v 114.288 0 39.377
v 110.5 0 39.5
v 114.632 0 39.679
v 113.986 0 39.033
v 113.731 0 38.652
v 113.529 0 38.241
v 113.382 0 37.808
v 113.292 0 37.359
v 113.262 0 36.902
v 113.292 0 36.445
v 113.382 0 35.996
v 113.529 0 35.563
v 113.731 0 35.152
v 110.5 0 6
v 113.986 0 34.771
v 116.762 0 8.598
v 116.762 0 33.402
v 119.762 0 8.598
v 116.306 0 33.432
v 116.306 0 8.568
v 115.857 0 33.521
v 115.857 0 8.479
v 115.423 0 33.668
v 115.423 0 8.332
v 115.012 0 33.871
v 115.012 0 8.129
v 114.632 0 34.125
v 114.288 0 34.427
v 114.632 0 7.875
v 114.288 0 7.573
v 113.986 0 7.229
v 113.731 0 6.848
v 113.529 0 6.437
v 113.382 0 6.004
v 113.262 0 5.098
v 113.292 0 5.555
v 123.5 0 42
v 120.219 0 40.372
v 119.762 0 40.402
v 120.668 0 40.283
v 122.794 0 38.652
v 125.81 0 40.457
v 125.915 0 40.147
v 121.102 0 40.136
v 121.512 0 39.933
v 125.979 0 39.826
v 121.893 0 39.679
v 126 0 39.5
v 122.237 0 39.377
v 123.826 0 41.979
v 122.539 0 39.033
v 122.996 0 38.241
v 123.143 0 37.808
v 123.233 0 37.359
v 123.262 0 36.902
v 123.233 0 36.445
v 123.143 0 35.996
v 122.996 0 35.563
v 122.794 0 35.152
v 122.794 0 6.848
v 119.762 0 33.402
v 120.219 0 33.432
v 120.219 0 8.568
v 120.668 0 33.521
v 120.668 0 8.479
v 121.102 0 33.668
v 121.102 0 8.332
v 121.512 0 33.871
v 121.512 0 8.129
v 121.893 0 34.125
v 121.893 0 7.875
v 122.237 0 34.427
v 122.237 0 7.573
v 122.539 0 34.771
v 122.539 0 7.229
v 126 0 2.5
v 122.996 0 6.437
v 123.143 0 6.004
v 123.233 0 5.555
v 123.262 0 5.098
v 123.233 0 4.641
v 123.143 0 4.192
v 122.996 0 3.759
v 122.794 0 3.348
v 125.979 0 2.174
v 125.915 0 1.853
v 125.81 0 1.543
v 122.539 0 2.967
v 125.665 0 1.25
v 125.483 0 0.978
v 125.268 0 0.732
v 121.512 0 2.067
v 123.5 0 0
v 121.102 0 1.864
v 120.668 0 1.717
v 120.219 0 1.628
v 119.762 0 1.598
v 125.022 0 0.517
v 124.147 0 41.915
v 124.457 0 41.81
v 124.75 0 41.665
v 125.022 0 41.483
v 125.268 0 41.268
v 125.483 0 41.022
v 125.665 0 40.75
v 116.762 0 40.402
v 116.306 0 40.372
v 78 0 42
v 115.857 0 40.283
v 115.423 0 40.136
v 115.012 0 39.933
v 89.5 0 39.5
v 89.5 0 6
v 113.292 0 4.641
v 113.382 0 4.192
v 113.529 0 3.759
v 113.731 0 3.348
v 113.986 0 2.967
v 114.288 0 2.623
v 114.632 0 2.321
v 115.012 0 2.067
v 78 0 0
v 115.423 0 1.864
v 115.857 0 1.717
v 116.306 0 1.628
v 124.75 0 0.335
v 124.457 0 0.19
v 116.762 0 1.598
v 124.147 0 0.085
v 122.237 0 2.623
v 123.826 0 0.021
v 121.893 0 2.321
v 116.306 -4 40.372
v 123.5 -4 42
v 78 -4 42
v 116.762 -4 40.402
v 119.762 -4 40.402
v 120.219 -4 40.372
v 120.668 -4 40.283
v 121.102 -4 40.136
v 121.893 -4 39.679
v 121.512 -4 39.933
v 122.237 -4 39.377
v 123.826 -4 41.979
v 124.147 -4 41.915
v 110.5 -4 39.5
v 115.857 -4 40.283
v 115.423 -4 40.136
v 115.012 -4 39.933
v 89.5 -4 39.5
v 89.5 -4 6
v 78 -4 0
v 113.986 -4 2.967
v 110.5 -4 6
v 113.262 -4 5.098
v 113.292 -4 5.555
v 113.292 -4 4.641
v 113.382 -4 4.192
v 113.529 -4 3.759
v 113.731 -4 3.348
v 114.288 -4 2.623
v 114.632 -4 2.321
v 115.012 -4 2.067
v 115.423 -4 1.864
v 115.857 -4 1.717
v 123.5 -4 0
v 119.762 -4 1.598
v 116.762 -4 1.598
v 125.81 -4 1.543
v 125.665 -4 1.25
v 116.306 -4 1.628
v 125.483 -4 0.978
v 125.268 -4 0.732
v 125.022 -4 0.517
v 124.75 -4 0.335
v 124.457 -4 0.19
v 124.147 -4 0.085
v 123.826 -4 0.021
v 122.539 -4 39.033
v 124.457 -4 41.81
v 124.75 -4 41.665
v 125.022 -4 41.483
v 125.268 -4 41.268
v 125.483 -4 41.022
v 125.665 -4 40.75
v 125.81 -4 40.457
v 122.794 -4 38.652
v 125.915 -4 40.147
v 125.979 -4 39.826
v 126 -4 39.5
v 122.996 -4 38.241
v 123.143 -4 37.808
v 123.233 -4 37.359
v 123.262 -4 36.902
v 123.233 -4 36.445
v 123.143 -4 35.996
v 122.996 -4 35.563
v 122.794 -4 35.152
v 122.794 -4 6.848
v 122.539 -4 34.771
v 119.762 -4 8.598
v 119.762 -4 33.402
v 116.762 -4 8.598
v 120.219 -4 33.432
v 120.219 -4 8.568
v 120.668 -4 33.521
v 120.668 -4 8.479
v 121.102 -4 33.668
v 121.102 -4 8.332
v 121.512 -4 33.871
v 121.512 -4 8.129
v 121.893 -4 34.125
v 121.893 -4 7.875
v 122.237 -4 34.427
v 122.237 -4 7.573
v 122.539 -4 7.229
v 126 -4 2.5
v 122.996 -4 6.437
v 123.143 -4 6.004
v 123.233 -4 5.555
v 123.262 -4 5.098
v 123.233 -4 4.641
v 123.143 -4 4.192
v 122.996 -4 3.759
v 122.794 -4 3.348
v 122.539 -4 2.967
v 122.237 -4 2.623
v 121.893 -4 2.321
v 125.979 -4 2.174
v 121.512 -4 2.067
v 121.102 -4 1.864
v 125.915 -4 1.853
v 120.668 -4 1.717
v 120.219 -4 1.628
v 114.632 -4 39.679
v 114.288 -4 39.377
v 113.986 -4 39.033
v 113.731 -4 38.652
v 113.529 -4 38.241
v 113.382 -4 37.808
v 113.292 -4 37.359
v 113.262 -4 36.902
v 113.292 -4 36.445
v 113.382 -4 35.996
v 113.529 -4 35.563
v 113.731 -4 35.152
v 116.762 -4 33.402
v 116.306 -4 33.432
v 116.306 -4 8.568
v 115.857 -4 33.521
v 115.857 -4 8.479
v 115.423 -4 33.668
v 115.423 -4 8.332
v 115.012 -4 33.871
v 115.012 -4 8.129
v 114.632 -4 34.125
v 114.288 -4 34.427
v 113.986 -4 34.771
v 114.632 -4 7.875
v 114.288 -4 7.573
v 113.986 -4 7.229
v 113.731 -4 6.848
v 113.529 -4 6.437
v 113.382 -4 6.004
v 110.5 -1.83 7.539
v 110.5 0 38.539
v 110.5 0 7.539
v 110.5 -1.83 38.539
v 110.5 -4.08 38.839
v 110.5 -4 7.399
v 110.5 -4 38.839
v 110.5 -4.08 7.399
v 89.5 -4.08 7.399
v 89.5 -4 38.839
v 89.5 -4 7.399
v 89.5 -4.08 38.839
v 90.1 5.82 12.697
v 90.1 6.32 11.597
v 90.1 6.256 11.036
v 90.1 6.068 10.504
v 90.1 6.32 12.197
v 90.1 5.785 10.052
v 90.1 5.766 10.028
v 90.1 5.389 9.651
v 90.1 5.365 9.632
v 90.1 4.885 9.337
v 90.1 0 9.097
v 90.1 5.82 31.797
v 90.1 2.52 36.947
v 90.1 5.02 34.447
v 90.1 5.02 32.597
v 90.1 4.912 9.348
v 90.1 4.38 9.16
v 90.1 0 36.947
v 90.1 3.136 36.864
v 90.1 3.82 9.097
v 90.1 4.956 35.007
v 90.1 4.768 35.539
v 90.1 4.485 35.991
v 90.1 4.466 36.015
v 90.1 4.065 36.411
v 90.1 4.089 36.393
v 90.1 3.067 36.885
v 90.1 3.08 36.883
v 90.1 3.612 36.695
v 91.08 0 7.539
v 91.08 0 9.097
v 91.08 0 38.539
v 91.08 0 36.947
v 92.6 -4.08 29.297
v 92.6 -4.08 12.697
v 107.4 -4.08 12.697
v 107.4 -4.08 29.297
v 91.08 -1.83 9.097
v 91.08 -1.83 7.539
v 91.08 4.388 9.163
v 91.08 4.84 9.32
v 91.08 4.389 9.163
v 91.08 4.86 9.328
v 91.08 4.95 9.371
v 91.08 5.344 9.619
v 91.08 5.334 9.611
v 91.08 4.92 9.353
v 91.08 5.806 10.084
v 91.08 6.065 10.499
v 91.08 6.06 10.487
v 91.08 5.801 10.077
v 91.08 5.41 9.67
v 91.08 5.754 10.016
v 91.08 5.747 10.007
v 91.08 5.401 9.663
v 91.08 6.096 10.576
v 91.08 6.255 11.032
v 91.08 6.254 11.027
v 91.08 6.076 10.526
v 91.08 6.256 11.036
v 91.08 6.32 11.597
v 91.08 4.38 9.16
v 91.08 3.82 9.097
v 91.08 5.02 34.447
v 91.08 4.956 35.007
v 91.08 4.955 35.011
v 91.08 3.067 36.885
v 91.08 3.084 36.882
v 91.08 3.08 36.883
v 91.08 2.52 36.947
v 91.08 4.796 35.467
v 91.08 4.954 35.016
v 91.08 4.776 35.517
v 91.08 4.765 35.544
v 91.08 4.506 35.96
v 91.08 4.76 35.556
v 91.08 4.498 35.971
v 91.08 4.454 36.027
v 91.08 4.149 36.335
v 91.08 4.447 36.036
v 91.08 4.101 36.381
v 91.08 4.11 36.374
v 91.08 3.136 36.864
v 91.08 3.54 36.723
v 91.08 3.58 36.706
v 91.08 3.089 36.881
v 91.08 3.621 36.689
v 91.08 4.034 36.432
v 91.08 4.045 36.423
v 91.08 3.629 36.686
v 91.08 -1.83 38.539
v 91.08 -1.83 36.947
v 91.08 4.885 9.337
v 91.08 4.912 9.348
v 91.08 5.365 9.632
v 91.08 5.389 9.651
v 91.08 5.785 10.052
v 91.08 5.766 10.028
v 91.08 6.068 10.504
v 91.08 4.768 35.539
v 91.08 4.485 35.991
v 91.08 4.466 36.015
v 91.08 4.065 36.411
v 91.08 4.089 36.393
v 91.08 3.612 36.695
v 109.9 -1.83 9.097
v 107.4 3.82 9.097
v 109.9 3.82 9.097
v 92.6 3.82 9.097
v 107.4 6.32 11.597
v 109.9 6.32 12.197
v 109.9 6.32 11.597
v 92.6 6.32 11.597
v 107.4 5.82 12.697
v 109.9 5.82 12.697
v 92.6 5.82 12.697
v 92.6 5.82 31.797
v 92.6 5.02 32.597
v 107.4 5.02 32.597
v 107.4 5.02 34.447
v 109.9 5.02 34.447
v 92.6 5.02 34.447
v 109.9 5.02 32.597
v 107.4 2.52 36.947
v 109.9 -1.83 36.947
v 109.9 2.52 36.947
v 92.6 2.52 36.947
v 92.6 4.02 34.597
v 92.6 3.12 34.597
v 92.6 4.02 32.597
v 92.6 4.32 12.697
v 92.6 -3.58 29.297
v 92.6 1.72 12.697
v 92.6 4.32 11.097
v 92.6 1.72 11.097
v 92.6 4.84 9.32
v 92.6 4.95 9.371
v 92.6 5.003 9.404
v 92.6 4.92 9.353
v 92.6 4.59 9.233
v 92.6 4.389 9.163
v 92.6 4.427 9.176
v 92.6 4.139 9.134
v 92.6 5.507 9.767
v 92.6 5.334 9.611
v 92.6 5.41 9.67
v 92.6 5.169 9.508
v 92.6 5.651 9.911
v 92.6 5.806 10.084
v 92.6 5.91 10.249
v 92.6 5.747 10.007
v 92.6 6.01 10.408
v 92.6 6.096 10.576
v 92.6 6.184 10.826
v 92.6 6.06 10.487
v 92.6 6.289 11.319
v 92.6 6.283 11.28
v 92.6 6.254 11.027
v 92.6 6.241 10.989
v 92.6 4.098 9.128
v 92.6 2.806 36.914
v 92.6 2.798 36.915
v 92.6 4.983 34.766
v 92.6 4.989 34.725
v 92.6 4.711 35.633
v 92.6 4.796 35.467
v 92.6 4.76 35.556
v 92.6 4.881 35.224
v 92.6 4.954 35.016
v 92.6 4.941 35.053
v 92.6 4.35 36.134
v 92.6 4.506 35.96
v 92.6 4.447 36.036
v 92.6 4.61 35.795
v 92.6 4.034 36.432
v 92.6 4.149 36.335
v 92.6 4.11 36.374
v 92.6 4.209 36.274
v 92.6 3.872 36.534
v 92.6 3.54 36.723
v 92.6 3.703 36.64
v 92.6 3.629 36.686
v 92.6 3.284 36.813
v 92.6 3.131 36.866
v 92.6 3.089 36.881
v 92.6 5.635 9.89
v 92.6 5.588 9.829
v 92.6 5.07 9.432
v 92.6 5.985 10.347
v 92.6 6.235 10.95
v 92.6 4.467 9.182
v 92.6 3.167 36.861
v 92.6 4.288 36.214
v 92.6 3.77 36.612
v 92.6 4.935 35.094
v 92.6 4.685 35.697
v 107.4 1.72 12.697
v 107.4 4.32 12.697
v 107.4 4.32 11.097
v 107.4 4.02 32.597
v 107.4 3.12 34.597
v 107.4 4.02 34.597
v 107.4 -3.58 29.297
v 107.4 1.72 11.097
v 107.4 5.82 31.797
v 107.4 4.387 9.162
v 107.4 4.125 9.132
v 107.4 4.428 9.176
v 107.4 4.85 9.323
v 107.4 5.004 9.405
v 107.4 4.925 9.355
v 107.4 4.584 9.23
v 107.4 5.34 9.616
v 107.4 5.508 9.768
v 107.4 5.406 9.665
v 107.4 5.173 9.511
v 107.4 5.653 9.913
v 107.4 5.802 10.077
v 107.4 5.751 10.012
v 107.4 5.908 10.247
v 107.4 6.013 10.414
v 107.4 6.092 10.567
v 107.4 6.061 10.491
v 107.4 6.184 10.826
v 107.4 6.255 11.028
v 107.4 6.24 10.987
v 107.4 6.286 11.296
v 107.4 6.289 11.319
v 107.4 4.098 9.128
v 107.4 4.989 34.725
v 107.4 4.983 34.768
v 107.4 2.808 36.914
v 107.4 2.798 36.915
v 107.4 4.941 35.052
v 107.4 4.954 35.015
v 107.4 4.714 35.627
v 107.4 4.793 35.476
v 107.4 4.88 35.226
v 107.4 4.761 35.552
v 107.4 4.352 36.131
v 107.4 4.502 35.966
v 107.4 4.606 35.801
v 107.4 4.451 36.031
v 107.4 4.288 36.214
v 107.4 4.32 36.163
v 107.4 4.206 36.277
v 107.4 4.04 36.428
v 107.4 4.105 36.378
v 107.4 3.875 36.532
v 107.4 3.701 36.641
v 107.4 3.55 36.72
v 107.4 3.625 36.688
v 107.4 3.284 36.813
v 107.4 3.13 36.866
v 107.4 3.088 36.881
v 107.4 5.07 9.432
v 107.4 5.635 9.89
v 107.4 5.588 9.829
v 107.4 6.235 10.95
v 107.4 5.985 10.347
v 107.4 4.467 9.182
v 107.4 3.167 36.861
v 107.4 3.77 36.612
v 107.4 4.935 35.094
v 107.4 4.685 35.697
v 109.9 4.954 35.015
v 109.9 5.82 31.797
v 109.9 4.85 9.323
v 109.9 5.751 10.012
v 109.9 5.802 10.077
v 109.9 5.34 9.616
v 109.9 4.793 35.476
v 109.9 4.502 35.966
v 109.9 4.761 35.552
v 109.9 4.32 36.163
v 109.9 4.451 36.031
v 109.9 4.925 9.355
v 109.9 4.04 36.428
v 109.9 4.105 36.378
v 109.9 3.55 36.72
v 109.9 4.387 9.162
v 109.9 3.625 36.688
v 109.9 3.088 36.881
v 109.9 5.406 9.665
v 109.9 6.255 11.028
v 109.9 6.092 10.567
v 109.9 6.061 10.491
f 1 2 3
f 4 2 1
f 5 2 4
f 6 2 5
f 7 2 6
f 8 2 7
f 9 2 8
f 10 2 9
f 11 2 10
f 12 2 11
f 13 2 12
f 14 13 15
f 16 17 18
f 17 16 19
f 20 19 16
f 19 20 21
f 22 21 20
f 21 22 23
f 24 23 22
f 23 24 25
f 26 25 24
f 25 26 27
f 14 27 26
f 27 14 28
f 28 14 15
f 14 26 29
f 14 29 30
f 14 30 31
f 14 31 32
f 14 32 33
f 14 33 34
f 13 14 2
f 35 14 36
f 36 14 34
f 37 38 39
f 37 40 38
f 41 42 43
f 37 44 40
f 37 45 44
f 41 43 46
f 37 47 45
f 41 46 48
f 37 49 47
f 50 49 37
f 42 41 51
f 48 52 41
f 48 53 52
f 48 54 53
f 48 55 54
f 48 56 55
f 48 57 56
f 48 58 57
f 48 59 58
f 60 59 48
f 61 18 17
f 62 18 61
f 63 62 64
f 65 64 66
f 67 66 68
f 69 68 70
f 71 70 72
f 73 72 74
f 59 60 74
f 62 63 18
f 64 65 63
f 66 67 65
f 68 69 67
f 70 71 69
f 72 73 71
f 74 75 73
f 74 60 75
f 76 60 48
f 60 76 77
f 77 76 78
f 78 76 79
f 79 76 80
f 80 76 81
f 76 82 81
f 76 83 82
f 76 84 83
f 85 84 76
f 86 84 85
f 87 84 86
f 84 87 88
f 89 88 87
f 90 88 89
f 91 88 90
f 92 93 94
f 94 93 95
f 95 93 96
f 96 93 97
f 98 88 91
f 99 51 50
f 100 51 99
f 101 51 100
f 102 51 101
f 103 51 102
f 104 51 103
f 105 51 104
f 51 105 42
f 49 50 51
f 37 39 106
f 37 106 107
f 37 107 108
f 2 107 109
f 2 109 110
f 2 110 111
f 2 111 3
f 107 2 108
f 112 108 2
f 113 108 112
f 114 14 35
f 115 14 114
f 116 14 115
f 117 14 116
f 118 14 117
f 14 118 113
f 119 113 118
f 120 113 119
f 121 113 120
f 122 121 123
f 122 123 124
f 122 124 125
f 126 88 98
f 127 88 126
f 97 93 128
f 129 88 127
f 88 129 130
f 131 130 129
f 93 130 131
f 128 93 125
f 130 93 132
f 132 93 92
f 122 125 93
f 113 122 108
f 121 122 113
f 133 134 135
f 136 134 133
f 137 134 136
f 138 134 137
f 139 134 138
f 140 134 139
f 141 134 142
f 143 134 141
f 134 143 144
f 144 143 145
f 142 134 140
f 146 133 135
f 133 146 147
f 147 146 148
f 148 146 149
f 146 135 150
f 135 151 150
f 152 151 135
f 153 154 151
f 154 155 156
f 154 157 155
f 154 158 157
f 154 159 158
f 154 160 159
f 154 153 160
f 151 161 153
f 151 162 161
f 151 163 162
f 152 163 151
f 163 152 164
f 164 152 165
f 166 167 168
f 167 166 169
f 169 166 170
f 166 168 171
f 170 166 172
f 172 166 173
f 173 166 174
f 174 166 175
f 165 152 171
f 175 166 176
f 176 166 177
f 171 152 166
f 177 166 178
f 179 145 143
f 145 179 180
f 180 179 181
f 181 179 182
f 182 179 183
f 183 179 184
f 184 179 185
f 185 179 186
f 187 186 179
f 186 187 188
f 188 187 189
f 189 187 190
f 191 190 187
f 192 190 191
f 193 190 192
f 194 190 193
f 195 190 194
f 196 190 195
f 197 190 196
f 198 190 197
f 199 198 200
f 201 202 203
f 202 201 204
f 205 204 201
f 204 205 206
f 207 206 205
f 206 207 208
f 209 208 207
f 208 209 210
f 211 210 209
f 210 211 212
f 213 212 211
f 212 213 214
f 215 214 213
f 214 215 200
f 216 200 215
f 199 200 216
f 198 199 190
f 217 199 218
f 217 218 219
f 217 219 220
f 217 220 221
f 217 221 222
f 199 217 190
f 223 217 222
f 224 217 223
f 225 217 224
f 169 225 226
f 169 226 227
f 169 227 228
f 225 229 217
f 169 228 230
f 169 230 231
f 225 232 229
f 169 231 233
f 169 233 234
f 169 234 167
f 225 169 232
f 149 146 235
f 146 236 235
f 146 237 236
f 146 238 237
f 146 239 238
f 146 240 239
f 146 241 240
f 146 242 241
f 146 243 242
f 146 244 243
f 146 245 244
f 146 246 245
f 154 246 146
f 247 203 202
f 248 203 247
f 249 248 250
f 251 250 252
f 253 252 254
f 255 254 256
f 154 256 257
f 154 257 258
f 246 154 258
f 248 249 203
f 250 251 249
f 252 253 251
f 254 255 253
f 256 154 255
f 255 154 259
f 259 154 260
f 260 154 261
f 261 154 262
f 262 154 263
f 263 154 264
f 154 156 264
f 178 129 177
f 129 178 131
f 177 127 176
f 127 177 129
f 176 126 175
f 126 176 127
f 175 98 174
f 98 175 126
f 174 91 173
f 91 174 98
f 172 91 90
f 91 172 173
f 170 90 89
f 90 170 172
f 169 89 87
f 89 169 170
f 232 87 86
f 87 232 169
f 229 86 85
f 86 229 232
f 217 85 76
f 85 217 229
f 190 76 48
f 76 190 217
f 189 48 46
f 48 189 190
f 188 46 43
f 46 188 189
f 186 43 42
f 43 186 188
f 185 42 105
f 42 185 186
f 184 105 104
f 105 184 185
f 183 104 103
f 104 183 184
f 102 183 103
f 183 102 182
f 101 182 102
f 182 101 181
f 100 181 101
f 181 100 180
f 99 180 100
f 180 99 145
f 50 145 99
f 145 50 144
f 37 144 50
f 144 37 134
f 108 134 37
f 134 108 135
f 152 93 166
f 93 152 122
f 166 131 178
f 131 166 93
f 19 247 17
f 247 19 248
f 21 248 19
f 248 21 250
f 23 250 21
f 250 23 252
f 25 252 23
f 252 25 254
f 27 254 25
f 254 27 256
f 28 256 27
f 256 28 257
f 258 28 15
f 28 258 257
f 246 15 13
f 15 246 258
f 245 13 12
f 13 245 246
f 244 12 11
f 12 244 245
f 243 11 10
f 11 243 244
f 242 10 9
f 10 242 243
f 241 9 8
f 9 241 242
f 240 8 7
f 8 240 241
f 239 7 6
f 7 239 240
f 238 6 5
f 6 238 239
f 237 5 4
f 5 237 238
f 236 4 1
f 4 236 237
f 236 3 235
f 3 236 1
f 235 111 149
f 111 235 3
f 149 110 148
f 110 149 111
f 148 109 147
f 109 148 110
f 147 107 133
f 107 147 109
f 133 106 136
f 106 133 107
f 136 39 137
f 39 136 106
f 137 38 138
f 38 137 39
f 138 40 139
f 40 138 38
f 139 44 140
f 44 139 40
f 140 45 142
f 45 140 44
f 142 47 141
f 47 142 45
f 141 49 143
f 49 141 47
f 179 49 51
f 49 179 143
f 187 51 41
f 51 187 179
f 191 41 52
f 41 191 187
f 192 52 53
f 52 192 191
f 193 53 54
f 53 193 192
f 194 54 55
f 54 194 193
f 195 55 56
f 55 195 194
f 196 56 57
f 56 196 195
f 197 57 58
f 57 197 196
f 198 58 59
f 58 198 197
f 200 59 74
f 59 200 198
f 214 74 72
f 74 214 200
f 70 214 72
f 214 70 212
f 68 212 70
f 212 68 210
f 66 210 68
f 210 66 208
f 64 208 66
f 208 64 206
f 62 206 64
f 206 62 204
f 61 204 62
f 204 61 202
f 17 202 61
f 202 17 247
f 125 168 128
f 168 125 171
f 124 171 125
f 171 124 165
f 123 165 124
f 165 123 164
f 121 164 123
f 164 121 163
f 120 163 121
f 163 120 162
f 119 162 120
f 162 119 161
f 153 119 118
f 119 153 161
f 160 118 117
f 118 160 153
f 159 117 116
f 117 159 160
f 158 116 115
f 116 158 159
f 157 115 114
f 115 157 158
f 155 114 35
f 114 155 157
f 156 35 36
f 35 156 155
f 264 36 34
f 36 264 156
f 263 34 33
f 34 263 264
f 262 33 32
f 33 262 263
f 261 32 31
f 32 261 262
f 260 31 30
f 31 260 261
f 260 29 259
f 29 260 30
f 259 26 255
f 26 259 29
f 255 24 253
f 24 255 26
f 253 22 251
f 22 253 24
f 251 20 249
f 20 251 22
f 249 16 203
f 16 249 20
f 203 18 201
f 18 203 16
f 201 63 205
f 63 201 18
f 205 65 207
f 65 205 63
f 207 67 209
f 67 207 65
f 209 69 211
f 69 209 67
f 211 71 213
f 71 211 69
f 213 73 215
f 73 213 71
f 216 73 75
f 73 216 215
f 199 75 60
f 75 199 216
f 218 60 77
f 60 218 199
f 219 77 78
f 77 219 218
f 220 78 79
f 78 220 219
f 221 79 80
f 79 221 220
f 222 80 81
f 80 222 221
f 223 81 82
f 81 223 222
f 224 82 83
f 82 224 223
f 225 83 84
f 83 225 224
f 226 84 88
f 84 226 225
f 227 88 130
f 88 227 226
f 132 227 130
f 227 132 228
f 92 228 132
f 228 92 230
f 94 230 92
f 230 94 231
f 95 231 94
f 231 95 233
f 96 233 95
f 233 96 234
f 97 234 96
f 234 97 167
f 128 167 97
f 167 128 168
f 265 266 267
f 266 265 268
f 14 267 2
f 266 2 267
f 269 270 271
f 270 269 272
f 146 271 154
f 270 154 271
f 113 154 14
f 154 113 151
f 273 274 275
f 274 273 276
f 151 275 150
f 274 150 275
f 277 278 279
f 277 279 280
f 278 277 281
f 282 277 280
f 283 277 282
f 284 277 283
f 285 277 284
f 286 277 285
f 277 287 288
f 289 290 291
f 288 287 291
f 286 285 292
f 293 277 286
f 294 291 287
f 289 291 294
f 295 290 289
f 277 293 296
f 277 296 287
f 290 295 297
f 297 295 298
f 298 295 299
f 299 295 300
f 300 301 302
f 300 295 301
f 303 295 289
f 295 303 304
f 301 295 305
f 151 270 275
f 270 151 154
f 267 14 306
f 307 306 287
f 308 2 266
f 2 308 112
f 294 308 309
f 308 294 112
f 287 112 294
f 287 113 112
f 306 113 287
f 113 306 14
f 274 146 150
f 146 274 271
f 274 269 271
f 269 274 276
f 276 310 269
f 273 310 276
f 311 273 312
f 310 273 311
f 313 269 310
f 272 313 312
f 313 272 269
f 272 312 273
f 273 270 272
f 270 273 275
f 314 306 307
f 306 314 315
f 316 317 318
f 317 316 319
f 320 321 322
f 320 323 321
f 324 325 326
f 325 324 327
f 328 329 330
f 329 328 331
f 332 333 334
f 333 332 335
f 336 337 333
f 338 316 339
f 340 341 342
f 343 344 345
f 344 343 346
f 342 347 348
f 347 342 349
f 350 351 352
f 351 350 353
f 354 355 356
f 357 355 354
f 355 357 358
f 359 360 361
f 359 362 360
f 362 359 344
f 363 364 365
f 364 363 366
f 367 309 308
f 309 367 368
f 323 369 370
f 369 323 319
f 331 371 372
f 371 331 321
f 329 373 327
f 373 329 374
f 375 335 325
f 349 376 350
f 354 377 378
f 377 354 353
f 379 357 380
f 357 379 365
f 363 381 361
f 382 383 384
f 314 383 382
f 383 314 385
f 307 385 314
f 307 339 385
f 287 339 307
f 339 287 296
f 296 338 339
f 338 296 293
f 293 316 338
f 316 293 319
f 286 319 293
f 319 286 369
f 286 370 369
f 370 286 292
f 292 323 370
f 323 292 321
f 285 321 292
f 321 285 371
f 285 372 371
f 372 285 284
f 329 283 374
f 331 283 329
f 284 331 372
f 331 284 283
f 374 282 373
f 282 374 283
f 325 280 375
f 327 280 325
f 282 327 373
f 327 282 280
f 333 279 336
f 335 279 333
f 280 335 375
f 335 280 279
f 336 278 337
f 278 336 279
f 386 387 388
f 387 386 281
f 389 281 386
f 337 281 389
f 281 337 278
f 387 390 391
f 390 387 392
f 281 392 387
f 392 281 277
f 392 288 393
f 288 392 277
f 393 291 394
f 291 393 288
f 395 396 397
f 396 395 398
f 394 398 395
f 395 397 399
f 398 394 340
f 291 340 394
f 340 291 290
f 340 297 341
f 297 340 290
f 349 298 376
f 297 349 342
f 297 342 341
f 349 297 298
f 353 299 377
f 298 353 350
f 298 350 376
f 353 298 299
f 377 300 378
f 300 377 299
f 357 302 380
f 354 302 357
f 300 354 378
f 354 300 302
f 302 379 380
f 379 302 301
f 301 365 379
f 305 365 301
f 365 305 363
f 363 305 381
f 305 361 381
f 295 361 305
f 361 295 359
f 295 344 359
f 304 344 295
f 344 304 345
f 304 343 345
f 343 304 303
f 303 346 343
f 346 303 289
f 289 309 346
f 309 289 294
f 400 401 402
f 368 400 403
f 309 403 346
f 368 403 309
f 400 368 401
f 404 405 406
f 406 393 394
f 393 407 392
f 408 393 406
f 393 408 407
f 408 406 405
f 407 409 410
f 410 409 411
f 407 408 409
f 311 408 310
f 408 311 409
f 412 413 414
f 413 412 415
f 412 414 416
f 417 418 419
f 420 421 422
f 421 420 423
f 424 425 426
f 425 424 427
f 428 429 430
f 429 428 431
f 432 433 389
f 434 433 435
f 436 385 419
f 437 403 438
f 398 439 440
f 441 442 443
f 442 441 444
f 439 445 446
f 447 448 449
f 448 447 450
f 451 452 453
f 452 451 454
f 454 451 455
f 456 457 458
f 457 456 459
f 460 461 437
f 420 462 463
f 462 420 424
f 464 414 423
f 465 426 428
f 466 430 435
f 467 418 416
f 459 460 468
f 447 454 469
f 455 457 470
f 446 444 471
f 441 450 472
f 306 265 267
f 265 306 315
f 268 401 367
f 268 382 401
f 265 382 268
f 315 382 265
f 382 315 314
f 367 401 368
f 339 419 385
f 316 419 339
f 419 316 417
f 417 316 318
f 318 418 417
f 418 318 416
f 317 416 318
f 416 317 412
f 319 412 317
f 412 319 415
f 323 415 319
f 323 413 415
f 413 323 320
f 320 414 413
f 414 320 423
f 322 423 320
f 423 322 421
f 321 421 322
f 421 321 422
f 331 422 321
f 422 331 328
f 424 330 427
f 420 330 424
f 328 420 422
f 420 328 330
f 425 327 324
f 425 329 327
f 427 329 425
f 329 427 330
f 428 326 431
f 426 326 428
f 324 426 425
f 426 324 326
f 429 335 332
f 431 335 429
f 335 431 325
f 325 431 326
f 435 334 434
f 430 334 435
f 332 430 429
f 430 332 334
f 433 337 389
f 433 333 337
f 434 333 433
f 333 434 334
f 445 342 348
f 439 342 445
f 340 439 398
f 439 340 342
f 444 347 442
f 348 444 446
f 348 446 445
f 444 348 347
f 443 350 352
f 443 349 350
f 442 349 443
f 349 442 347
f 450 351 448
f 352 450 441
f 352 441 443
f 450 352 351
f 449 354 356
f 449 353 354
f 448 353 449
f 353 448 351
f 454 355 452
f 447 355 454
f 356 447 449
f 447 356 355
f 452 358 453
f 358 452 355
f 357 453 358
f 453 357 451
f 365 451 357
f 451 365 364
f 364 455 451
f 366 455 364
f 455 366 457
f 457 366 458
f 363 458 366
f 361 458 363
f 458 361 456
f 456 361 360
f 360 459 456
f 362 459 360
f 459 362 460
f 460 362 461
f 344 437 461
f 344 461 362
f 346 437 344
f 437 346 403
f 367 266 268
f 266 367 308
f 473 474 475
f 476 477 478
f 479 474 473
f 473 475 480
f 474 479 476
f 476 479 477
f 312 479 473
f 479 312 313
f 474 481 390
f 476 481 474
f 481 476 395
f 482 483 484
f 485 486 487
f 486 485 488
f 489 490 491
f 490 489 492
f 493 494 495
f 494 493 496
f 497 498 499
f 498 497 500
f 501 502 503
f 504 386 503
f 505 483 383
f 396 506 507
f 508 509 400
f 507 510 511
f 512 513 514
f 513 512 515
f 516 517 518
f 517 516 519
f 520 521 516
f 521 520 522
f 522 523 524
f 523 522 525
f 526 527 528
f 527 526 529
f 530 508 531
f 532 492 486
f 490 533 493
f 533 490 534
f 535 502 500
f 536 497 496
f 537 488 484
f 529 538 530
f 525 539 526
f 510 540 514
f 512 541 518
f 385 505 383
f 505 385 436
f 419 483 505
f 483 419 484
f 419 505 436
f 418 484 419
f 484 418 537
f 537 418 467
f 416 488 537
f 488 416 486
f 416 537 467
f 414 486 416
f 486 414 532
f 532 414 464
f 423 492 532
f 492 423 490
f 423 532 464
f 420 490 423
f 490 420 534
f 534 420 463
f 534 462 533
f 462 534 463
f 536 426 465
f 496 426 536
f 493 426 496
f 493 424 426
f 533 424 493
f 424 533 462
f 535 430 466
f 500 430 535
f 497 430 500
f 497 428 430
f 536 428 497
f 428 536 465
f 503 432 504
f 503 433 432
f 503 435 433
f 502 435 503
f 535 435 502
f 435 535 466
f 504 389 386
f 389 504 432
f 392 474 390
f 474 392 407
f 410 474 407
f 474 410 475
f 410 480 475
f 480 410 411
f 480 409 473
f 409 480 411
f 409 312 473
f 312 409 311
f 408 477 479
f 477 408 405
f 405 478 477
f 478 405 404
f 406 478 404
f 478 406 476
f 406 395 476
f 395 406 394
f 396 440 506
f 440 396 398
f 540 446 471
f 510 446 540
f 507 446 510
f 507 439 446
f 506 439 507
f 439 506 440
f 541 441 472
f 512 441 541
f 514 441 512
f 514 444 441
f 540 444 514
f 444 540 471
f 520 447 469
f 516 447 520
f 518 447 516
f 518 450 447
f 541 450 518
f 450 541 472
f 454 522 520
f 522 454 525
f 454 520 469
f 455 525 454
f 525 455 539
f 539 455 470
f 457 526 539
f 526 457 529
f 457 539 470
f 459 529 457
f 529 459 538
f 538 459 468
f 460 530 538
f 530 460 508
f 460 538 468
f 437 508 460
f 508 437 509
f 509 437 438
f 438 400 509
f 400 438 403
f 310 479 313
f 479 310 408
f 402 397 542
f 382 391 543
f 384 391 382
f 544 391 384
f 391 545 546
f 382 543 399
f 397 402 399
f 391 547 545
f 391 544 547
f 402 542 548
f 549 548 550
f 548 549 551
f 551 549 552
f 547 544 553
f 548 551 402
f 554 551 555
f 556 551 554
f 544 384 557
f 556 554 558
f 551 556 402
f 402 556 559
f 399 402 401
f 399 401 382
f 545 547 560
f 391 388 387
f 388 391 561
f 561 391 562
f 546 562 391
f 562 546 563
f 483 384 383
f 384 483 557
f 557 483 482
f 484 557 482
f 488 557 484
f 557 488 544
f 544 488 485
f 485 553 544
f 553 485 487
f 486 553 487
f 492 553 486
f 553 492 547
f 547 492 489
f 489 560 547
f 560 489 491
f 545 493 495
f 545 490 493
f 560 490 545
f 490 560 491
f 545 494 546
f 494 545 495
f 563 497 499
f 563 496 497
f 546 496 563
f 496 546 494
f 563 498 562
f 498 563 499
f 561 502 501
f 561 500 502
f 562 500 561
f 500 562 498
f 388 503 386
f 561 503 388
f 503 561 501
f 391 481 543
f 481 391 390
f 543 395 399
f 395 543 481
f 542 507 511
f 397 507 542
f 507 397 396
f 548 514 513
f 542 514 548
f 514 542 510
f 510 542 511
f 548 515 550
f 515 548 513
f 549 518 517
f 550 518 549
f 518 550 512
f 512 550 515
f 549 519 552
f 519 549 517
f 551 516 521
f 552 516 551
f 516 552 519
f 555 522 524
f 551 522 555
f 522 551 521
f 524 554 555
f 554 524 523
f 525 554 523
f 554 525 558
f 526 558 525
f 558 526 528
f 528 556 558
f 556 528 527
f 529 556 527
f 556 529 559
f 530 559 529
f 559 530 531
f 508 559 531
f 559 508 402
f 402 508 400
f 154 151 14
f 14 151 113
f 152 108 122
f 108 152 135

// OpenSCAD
// Lab Rax generic equipment tray + faceplate (wizard template).
// Faceplate derived from the Pi4 baseline; rack holes follow the four-corner layout of the user-supplied
// 1U blank plate (faceplate_mounting.json): EVERY rack unit gets 4 holes, never a single centre pair.
// The wizard appends override assignments at the end of this file.
// PROPOSED, UNVALIDATED: printed fit, strength and rack clearance are UNKNOWN.
$fn=48;
part="assembly";            // assembly, faceplate, tray, combined, rear_bracket
// Device envelope (mm). Origin of hole coordinates = device front-left corner, seen from above.
dev_w=85; dev_d=56; dev_h=20;
holes=[];                   // [[x,y],...] mounting hole centres
hole_d=2.7;                 // device mounting hole diameter
device_mount="inserts";     // inserts, pegs, clips, straps
standoff=6;                 // device lift above tray floor
insert_pilot=3.2;           // pilot for heat-set insert (inserts mode)
board_t=1.6;                // board/flange thickness (pegs, clips)
joint="screw";              // screw, single ("snap" retired 2026-10-19: too brittle; kept as history)
u=1;                        // faceplate height in rack units
keystones=[];               // [x,...] keystone centres on faceplate (X=0 centre)
// Keystone v2 (2026-10-19, now the fallback; see ks_style): re-modelled from measurements of Brian's reference keystone frame
// (14.5 x 16 opening was too narrow when printed). Opening 14.8 x 16.6 through the plate, plus a rear collar
// 19.8 x 27.85 reaching 9.2 mm behind the front face (bottom lip to 10.4) that carries the latch ramp and catches.
ks_w=14.8; ks_h=16.6;       // front opening
ks_ow=19.8; ks_ob=11.9; ks_ot=15.95; ks_od=9.2; ks_lip=10.4;  // collar width, below/above opening centre, depth
ports=[];                   // [[x,z,w,h,r],...] faceplate cut-outs, z from plate bottom, r=corner radius
front_gap=12;               // device front to faceplate rear face
margin=8;                   // tray border around device
rear_support=false;         // heavy/deep equipment: tray runs to the rear posts and screws to a rear bracket
coupon=[];                  // test coupon: [x0,x1,ymax] keeps only that slice of the part

// 4 mm plate (owner default 2026-10-18). Corner radius is limited by the four-corner holes:
// the reference holes sit 1.6 mm from the top/bottom edge, so larger corners would cut into them.
plate_w=252; plate_t=4; plate_r=2.5; plate_h=u*44.45-2.45;
hole_x=118.2625; hole_dz=15.902;   // each U: holes at its centre ±hole_dz (5.098 / 36.902 on a 1U plate)
rack_depth=240;             // Lab Rax frame depth (front of front posts to back of rear posts)
nudge=0;                    // render-repair only: tiny size offset applied when OpenSCAD 2021 emits a sliver
tray_t=3; tray_z=7;
tray_w=dev_w+2*margin; tray_d=rear_support?rack_depth:dev_d+front_gap+margin;
tray_x=-tray_w/2; tray_y=0;
dev_x=-dev_w/2; dev_y=front_gap; floor_top=tray_z+tray_t;
jx=min(40,tray_w/2-12); joint_x=[-jx,jx];
tongue_w=12; tongue_depth=7; tongue_h=3; tongue_z=tray_z+3.5;
slot_clear=0.3; boss_d=9; m3_clear=3.4; joint_pilot=4.0;  // 4.0 = the printed, well-fitting Pi4 trial

module capsule2d(len=10,diam=7){hull(){translate([-(len-diam)/2,0])circle(d=diam);translate([(len-diam)/2,0])circle(d=diam);}}
module rrect(w,h,r){rr=min(r,w/2-0.01,h/2-0.01);if(rr<=0)square([w,h],center=true);else offset(r=rr)square([w-2*rr,h-2*rr],center=true);}
// Mirror front-of-tray features to the rear (about the rack's mid-depth).
module to_rear(){translate([0,rack_depth/2,0])mirror([0,1,0])translate([0,-rack_depth/2,0])children();}

// Faceplate outline seen from the front: 2D X = rack X, 2D Y = height Z.
// rear=true cuts the larger keystone pocket; plain=true leaves out keystones/ports (rear bracket).
module plate2d(rear=false,plain=false){
 difference(){
  hull()for(sx=[-1,1],sz=[-1,1])translate([sx*(plate_w/2-plate_r),plate_h/2+sz*(plate_h/2-plate_r)])circle(r=plate_r+nudge);
  for(i=[0:u-1],dz=[-hole_dz,hole_dz],x=[-hole_x,hole_x])translate([x,i*44.45+21+dz])capsule2d();
  if(!plain){
   for(p=ports)translate([p[0],p[1]])rrect(p[2],p[3],p[4]);
  }
 }
}
// Plate between y=y0 (front) and y0+t, built from the 2D outline (cleaner meshes than 3D cuts in OpenSCAD 2021).
module plate_layer(y0,t,rear=false,plain=false){translate([0,y0+t,0])rotate([90,0,0])linear_extrude(height=t)plate2d(rear,plain);}

module plate_joint_add(){
 if(joint=="screw"){
  for(x=joint_x)translate([x-tongue_w/2,0,tongue_z])cube([tongue_w,tongue_depth,tongue_h]);
  for(x=joint_x)translate([x,0,tray_z+14])rotate([-90,0,0])cylinder(d=boss_d,h=8);
 }
 if(joint=="snap") for(x=joint_x){
  // Cantilever arm under the tray floor; barb snaps up into a floor window.
  translate([x-4,0,tray_z-2])cube([8,16,2]);
  // Barb v2: square catch face toward the plate, ramp falling toward the rear so the tray, slid in
  // from the rear, cams the arm down until its window drops over the barb.
  translate([x-4,12,tray_z])hull(){cube([8,0.6,1.2]);cube([8,2.4,0.01]);}
 }
}
// Keystone collar behind the plate, and the jack-shaped cut through plate + collar.
// Profile in (d = depth behind front face, z from opening centre); X width is ks_w throughout.
module ks_collar(){for(x=keystones)translate([x-ks_ow/2,-plate_t,plate_h/2]){
 translate([0,0,-ks_ob])cube([ks_ow,ks_od,ks_ob+ks_ot]);
 translate([0,0,-ks_ob])cube([ks_ow,ks_lip,ks_ob-ks_h/2]);
}}
module ks_cut(){for(x=keystones)translate([x-ks_w/2,-plate_t,plate_h/2])rotate([90,0,90])linear_extrude(height=ks_w)
 polygon([[-1,-ks_h/2],[5.8,-ks_h/2],[5.8,-9.9],[9.2,-9.9],[9.2,-ks_h/2],[11,-ks_h/2],[11,11.6],[8.2,11.6],
          [8.2,ks_ot+1],[7.2,ks_ot+1],[7.2,13.6],[0.6,ks_h/2],[-1,ks_h/2]]);}
// Golden keystone (Brian, 2026-10-19): exact cross-sections of the keystone on Brian's SG108 faceplate, which fits
// perfectly in practice. Source: "10 inch shelf TP-Link SG108 Plus Keystone" by Goul (MakerWorld remix, BY-NC-SA),
// local/personal use only, never redistributed. Each band: [X from opening centre, width, polygons in source (Y, Z)]
// with source Y running down the plate (opening centre Y=25.09) and Z = depth (keystone face 0, plate back 4.08).
// The block replaces the plate within 21 x 33.5 mm around each keystone; front face sits 0.08 proud like the source.
ks_style="golden";          // golden (SG108 copy) or v2 (own measured rebuild, kept as fallback)
KS_GOLD=[
  [-10.50,0.60,[[[45.500,4.080],[45.500,0.080],[38.691,0.080],[38.691,0.000],[7.251,0.000],[7.251,0.080],[1.000,0.080],[1.000,4.080],[1.071,4.080]]]],
  [-9.90,0.98,[[[9.143,4.080],[9.143,6.600],[9.205,7.147],[9.207,7.160],[9.226,7.216],[9.395,7.692],[9.679,8.145],[9.697,8.169],[10.075,8.546],[10.099,8.565],[10.551,8.848],[11.083,9.036],[11.643,9.100],[13.493,9.100],[14.293,9.900],[33.393,9.900],[33.893,10.400],[34.493,10.400],[35.054,10.336],[35.586,10.148],[36.038,9.865],[36.062,9.846],[36.439,9.469],[36.458,9.445],[36.742,8.992],[36.753,8.965],[36.930,8.460],[36.993,7.900],[36.993,4.080],[45.500,4.080],[45.500,0.080],[38.691,0.080],[38.691,0.000],[7.251,0.000],[7.251,0.080],[1.000,0.080],[1.000,4.080],[1.014,4.080]]]],
  [-8.92,1.52,[[[7.551,4.080],[7.551,2.250],[9.143,2.250],[9.143,6.600],[9.209,7.169],[9.367,7.620],[9.404,7.709],[9.658,8.114],[9.716,8.190],[9.755,8.229],[10.054,8.527],[10.130,8.586],[10.534,8.840],[10.623,8.876],[11.074,9.034],[11.643,9.100],[13.493,9.100],[14.293,9.900],[33.393,9.900],[33.893,10.400],[34.493,10.400],[35.063,10.334],[35.514,10.176],[35.603,10.140],[36.006,9.886],[36.083,9.827],[36.420,9.490],[36.479,9.414],[36.719,9.030],[36.737,9.000],[36.770,8.920],[36.927,8.469],[36.993,7.900],[36.993,2.250],[38.551,2.250],[38.551,4.080],[45.500,4.080],[45.500,0.080],[38.691,0.080],[38.691,0.000],[7.251,0.000],[7.251,0.080],[1.000,0.080],[1.000,4.080],[1.044,4.080]]]],
  [-7.40,14.80,[[[7.551,4.080],[7.551,2.250],[9.143,2.250],[9.143,6.600],[9.175,6.878],[9.229,7.247],[9.478,7.850],[9.876,8.368],[10.393,8.765],[10.996,9.015],[11.365,9.069],[11.643,9.100],[13.493,9.100],[13.493,8.100],[11.493,8.100],[11.493,7.200],[16.793,0.500],[16.793,0.000],[7.251,0.000],[7.251,0.080],[1.000,0.080],[1.000,4.080],[1.025,4.080]],[[45.500,4.080],[45.500,0.080],[38.691,0.080],[38.691,0.000],[33.393,0.000],[33.393,5.800],[34.993,5.800],[34.993,8.400],[33.393,8.400],[33.393,9.900],[33.893,10.400],[34.493,10.400],[34.771,10.369],[35.140,10.315],[35.743,10.065],[36.200,9.715],[36.261,9.668],[36.658,9.150],[36.908,8.547],[36.962,8.178],[36.993,7.900],[36.993,2.250],[38.551,2.250],[38.551,4.080],[42.555,4.080]]]],
  [7.40,2.50,[[[45.500,4.080],[45.500,0.080],[38.691,0.080],[38.691,0.000],[7.251,0.000],[7.251,0.080],[1.000,0.080],[1.000,4.080],[7.551,4.080],[7.551,2.250],[9.143,2.250],[9.143,6.600],[9.209,7.168],[9.370,7.630],[9.402,7.705],[9.662,8.120],[9.712,8.185],[9.927,8.400],[10.059,8.531],[10.124,8.582],[10.538,8.841],[10.614,8.873],[11.075,9.034],[11.643,9.100],[13.493,9.100],[14.293,9.900],[33.393,9.900],[33.893,10.400],[34.493,10.400],[35.062,10.335],[35.523,10.172],[35.599,10.141],[36.013,9.882],[36.078,9.831],[36.425,9.486],[36.474,9.420],[36.735,9.005],[36.767,8.930],[36.928,8.467],[36.993,7.900],[36.993,2.250],[38.551,2.250],[38.551,4.080],[42.599,4.080]]]],
  [9.90,0.60,[[[45.500,4.080],[45.500,0.080],[38.691,0.080],[38.691,0.000],[7.251,0.000],[7.251,0.080],[1.000,0.080],[1.000,4.080],[7.551,4.080],[7.551,2.250],[38.551,2.250],[38.551,4.080],[42.635,4.080]]]]
];
module ks_golden(){for(x=keystones)translate([x,0,plate_h/2])multmatrix([[1,0,0,0],[0,0,1,-4.08],[0,-1,0,25.09],[0,0,0,1]])
 intersection(){
  union()for(b=KS_GOLD)translate([b[0],0,0])rotate([90,0,90])linear_extrude(height=b[1])for(pg=b[2])polygon(pg);
  translate([-10.5,25.09-18.5,-0.01])cube([21,33.5,10.42]);
 }}
module ks_box_cut(){for(x=keystones)translate([x-10.5,-plate_t-0.01,plate_h/2-15])cube([21,plate_t+0.02,33.5]);}
module plate_joint_cut(){if(joint=="screw")for(x=joint_x)translate([x,-0.1,tray_z+14])rotate([-90,0,0])cylinder(d=joint_pilot,h=8.2);}

module faceplate(){
 union(){
  difference(){
   union(){
    plate_layer(-plate_t,plate_t);
    if(ks_style=="v2")ks_collar();
    plate_joint_add();
   }
   plate_joint_cut();
   if(ks_style=="v2")ks_cut(); else ks_box_cut();
  }
  if(ks_style!="v2")ks_golden();
 }
}
// Plain plate on the rear posts (mirror of the faceplate, no openings) that the tray's rear end screws/snaps to.
module rear_bracket(){to_rear()difference(){union(){plate_layer(-plate_t,plate_t,false,true);plate_joint_add();}plate_joint_cut();}}

module device_features_add(){
 if(device_mount=="inserts")for(h=holes)translate([dev_x+h[0],dev_y+h[1],floor_top])cylinder(d=max(insert_pilot+3.5,7),h=standoff);
 if(device_mount=="pegs")for(h=holes)translate([dev_x+h[0],dev_y+h[1],floor_top]){
  cylinder(d=hole_d+3,h=standoff);
  translate([0,0,standoff])cylinder(d=hole_d-0.3,h=board_t+0.8);
  translate([0,0,standoff+board_t+0.8])cylinder(d1=hole_d-0.3,d2=hole_d-1,h=0.8);
 }
 if(device_mount=="clips"){
  // Support ledges at the four corners plus a flexing clip on each side.
  for(x=[dev_x-1,dev_x+dev_w-5],y=[dev_y-1,dev_y+dev_d-5])translate([x,y,floor_top])cube([6,6,standoff]);
  for(s=[-1,1])translate([s>0?dev_x+dev_w+0.2:dev_x-2.2,dev_y+dev_d/2-5,floor_top]){
   cube([2,10,standoff+board_t+2.5]);
   translate([s>0?-1.2:2,0,standoff+board_t+0.2])hull(){cube([1.2,10,1.6]);translate([s>0?1.2:0,0,1.6])cube([0.01,10,0.6]);}
  }
 }
}
module device_features_cut(){
 if(device_mount=="inserts")for(h=holes)translate([dev_x+h[0],dev_y+h[1],floor_top+0.01])cylinder(d=insert_pilot,h=standoff+0.1);
 if(device_mount=="straps")for(x=[dev_x-5.5,dev_x+dev_w+2.5],y=[dev_y+dev_d*0.25,dev_y+dev_d*0.75])
  translate([x,y-6,tray_z-0.1])cube([3,12,tray_t+0.2]);
}

module tray_joint_add(){
 if(joint=="screw"){
  for(x=joint_x) translate([x-9,0,tray_z+tray_t])cube([18,8,5]);
  for(x=joint_x)translate([x-7,8.3,tray_z+3])cube([14,3,19]);
  for(x=joint_x) for(side=[-1,1]) translate([x+side*6-1,0,0])
    hull(){translate([0,9,tray_z+2.7])cube([2,2,0.5]);
           translate([0,9,tray_z+8])cube([2,2,0.5]);
           translate([0,20,tray_z+2.7])cube([2,2,0.5]);}
 }
}
module tray_joint_cut(){
 if(joint=="screw"){
  for(x=joint_x)translate([x-(tongue_w+slot_clear)/2,-0.1,tongue_z-slot_clear/2])cube([tongue_w+slot_clear,tongue_depth+slot_clear,tongue_h+slot_clear]);
  for(x=joint_x)translate([x,11.4,tray_z+14])rotate([90,0,0])cylinder(d=m3_clear,h=12);
 }
 if(joint=="snap")for(x=joint_x)translate([x-4.3,11.6,tray_z-0.1])cube([8.6,3.2,tray_t+0.2]);
}

module tray(){
 difference(){
  union(){
   translate([tray_x,tray_y,tray_z])cube([tray_w,tray_d,tray_t]);
   tray_joint_add();
   if(rear_support)to_rear()tray_joint_add();
   device_features_add();
  }
  tray_joint_cut();
  if(rear_support)to_rear()tray_joint_cut();
  device_features_cut();
 }
}

module clip_coupon(){if(len(coupon)==3)intersection(){children();translate([coupon[0],-50,-50])cube([coupon[1]-coupon[0],coupon[2]+50,400]);}else children();}

clip_coupon(){
 if(part=="faceplate")faceplate();
 else if(part=="tray")tray();
 else if(part=="rear_bracket")rear_bracket();
 else if(part=="combined")union(){faceplate();translate([tray_x,-0.01,tray_z])cube([tray_w,0.02+0.01,tray_t]);tray();if(rear_support)rear_bracket();}
 else {color("steelblue")faceplate();color("silver")tray();if(rear_support)color("steelblue")rear_bracket();
  %translate([dev_x,dev_y,floor_top+(device_mount=="inserts"||device_mount=="pegs"||device_mount=="clips"?standoff:0)])cube([dev_w,dev_d,dev_h]);}
}

// ---- wizard overrides: 1_Keystone_and_corner_holes
dev_w=85.0;
dev_d=56.0;
dev_h=20.0;
hole_d=2.7;
standoff=6.0;
insert_pilot=3.2;
board_t=1.6;
u=1;
holes=[[3.5, 3.5], [61.5, 3.5], [3.5, 52.5], [61.5, 52.5]];
keystones=[100.0];
device_mount="inserts";
joint="screw";
rear_support=false;
coupon=[78.0, 127.0, 11.0];
ports=[];
